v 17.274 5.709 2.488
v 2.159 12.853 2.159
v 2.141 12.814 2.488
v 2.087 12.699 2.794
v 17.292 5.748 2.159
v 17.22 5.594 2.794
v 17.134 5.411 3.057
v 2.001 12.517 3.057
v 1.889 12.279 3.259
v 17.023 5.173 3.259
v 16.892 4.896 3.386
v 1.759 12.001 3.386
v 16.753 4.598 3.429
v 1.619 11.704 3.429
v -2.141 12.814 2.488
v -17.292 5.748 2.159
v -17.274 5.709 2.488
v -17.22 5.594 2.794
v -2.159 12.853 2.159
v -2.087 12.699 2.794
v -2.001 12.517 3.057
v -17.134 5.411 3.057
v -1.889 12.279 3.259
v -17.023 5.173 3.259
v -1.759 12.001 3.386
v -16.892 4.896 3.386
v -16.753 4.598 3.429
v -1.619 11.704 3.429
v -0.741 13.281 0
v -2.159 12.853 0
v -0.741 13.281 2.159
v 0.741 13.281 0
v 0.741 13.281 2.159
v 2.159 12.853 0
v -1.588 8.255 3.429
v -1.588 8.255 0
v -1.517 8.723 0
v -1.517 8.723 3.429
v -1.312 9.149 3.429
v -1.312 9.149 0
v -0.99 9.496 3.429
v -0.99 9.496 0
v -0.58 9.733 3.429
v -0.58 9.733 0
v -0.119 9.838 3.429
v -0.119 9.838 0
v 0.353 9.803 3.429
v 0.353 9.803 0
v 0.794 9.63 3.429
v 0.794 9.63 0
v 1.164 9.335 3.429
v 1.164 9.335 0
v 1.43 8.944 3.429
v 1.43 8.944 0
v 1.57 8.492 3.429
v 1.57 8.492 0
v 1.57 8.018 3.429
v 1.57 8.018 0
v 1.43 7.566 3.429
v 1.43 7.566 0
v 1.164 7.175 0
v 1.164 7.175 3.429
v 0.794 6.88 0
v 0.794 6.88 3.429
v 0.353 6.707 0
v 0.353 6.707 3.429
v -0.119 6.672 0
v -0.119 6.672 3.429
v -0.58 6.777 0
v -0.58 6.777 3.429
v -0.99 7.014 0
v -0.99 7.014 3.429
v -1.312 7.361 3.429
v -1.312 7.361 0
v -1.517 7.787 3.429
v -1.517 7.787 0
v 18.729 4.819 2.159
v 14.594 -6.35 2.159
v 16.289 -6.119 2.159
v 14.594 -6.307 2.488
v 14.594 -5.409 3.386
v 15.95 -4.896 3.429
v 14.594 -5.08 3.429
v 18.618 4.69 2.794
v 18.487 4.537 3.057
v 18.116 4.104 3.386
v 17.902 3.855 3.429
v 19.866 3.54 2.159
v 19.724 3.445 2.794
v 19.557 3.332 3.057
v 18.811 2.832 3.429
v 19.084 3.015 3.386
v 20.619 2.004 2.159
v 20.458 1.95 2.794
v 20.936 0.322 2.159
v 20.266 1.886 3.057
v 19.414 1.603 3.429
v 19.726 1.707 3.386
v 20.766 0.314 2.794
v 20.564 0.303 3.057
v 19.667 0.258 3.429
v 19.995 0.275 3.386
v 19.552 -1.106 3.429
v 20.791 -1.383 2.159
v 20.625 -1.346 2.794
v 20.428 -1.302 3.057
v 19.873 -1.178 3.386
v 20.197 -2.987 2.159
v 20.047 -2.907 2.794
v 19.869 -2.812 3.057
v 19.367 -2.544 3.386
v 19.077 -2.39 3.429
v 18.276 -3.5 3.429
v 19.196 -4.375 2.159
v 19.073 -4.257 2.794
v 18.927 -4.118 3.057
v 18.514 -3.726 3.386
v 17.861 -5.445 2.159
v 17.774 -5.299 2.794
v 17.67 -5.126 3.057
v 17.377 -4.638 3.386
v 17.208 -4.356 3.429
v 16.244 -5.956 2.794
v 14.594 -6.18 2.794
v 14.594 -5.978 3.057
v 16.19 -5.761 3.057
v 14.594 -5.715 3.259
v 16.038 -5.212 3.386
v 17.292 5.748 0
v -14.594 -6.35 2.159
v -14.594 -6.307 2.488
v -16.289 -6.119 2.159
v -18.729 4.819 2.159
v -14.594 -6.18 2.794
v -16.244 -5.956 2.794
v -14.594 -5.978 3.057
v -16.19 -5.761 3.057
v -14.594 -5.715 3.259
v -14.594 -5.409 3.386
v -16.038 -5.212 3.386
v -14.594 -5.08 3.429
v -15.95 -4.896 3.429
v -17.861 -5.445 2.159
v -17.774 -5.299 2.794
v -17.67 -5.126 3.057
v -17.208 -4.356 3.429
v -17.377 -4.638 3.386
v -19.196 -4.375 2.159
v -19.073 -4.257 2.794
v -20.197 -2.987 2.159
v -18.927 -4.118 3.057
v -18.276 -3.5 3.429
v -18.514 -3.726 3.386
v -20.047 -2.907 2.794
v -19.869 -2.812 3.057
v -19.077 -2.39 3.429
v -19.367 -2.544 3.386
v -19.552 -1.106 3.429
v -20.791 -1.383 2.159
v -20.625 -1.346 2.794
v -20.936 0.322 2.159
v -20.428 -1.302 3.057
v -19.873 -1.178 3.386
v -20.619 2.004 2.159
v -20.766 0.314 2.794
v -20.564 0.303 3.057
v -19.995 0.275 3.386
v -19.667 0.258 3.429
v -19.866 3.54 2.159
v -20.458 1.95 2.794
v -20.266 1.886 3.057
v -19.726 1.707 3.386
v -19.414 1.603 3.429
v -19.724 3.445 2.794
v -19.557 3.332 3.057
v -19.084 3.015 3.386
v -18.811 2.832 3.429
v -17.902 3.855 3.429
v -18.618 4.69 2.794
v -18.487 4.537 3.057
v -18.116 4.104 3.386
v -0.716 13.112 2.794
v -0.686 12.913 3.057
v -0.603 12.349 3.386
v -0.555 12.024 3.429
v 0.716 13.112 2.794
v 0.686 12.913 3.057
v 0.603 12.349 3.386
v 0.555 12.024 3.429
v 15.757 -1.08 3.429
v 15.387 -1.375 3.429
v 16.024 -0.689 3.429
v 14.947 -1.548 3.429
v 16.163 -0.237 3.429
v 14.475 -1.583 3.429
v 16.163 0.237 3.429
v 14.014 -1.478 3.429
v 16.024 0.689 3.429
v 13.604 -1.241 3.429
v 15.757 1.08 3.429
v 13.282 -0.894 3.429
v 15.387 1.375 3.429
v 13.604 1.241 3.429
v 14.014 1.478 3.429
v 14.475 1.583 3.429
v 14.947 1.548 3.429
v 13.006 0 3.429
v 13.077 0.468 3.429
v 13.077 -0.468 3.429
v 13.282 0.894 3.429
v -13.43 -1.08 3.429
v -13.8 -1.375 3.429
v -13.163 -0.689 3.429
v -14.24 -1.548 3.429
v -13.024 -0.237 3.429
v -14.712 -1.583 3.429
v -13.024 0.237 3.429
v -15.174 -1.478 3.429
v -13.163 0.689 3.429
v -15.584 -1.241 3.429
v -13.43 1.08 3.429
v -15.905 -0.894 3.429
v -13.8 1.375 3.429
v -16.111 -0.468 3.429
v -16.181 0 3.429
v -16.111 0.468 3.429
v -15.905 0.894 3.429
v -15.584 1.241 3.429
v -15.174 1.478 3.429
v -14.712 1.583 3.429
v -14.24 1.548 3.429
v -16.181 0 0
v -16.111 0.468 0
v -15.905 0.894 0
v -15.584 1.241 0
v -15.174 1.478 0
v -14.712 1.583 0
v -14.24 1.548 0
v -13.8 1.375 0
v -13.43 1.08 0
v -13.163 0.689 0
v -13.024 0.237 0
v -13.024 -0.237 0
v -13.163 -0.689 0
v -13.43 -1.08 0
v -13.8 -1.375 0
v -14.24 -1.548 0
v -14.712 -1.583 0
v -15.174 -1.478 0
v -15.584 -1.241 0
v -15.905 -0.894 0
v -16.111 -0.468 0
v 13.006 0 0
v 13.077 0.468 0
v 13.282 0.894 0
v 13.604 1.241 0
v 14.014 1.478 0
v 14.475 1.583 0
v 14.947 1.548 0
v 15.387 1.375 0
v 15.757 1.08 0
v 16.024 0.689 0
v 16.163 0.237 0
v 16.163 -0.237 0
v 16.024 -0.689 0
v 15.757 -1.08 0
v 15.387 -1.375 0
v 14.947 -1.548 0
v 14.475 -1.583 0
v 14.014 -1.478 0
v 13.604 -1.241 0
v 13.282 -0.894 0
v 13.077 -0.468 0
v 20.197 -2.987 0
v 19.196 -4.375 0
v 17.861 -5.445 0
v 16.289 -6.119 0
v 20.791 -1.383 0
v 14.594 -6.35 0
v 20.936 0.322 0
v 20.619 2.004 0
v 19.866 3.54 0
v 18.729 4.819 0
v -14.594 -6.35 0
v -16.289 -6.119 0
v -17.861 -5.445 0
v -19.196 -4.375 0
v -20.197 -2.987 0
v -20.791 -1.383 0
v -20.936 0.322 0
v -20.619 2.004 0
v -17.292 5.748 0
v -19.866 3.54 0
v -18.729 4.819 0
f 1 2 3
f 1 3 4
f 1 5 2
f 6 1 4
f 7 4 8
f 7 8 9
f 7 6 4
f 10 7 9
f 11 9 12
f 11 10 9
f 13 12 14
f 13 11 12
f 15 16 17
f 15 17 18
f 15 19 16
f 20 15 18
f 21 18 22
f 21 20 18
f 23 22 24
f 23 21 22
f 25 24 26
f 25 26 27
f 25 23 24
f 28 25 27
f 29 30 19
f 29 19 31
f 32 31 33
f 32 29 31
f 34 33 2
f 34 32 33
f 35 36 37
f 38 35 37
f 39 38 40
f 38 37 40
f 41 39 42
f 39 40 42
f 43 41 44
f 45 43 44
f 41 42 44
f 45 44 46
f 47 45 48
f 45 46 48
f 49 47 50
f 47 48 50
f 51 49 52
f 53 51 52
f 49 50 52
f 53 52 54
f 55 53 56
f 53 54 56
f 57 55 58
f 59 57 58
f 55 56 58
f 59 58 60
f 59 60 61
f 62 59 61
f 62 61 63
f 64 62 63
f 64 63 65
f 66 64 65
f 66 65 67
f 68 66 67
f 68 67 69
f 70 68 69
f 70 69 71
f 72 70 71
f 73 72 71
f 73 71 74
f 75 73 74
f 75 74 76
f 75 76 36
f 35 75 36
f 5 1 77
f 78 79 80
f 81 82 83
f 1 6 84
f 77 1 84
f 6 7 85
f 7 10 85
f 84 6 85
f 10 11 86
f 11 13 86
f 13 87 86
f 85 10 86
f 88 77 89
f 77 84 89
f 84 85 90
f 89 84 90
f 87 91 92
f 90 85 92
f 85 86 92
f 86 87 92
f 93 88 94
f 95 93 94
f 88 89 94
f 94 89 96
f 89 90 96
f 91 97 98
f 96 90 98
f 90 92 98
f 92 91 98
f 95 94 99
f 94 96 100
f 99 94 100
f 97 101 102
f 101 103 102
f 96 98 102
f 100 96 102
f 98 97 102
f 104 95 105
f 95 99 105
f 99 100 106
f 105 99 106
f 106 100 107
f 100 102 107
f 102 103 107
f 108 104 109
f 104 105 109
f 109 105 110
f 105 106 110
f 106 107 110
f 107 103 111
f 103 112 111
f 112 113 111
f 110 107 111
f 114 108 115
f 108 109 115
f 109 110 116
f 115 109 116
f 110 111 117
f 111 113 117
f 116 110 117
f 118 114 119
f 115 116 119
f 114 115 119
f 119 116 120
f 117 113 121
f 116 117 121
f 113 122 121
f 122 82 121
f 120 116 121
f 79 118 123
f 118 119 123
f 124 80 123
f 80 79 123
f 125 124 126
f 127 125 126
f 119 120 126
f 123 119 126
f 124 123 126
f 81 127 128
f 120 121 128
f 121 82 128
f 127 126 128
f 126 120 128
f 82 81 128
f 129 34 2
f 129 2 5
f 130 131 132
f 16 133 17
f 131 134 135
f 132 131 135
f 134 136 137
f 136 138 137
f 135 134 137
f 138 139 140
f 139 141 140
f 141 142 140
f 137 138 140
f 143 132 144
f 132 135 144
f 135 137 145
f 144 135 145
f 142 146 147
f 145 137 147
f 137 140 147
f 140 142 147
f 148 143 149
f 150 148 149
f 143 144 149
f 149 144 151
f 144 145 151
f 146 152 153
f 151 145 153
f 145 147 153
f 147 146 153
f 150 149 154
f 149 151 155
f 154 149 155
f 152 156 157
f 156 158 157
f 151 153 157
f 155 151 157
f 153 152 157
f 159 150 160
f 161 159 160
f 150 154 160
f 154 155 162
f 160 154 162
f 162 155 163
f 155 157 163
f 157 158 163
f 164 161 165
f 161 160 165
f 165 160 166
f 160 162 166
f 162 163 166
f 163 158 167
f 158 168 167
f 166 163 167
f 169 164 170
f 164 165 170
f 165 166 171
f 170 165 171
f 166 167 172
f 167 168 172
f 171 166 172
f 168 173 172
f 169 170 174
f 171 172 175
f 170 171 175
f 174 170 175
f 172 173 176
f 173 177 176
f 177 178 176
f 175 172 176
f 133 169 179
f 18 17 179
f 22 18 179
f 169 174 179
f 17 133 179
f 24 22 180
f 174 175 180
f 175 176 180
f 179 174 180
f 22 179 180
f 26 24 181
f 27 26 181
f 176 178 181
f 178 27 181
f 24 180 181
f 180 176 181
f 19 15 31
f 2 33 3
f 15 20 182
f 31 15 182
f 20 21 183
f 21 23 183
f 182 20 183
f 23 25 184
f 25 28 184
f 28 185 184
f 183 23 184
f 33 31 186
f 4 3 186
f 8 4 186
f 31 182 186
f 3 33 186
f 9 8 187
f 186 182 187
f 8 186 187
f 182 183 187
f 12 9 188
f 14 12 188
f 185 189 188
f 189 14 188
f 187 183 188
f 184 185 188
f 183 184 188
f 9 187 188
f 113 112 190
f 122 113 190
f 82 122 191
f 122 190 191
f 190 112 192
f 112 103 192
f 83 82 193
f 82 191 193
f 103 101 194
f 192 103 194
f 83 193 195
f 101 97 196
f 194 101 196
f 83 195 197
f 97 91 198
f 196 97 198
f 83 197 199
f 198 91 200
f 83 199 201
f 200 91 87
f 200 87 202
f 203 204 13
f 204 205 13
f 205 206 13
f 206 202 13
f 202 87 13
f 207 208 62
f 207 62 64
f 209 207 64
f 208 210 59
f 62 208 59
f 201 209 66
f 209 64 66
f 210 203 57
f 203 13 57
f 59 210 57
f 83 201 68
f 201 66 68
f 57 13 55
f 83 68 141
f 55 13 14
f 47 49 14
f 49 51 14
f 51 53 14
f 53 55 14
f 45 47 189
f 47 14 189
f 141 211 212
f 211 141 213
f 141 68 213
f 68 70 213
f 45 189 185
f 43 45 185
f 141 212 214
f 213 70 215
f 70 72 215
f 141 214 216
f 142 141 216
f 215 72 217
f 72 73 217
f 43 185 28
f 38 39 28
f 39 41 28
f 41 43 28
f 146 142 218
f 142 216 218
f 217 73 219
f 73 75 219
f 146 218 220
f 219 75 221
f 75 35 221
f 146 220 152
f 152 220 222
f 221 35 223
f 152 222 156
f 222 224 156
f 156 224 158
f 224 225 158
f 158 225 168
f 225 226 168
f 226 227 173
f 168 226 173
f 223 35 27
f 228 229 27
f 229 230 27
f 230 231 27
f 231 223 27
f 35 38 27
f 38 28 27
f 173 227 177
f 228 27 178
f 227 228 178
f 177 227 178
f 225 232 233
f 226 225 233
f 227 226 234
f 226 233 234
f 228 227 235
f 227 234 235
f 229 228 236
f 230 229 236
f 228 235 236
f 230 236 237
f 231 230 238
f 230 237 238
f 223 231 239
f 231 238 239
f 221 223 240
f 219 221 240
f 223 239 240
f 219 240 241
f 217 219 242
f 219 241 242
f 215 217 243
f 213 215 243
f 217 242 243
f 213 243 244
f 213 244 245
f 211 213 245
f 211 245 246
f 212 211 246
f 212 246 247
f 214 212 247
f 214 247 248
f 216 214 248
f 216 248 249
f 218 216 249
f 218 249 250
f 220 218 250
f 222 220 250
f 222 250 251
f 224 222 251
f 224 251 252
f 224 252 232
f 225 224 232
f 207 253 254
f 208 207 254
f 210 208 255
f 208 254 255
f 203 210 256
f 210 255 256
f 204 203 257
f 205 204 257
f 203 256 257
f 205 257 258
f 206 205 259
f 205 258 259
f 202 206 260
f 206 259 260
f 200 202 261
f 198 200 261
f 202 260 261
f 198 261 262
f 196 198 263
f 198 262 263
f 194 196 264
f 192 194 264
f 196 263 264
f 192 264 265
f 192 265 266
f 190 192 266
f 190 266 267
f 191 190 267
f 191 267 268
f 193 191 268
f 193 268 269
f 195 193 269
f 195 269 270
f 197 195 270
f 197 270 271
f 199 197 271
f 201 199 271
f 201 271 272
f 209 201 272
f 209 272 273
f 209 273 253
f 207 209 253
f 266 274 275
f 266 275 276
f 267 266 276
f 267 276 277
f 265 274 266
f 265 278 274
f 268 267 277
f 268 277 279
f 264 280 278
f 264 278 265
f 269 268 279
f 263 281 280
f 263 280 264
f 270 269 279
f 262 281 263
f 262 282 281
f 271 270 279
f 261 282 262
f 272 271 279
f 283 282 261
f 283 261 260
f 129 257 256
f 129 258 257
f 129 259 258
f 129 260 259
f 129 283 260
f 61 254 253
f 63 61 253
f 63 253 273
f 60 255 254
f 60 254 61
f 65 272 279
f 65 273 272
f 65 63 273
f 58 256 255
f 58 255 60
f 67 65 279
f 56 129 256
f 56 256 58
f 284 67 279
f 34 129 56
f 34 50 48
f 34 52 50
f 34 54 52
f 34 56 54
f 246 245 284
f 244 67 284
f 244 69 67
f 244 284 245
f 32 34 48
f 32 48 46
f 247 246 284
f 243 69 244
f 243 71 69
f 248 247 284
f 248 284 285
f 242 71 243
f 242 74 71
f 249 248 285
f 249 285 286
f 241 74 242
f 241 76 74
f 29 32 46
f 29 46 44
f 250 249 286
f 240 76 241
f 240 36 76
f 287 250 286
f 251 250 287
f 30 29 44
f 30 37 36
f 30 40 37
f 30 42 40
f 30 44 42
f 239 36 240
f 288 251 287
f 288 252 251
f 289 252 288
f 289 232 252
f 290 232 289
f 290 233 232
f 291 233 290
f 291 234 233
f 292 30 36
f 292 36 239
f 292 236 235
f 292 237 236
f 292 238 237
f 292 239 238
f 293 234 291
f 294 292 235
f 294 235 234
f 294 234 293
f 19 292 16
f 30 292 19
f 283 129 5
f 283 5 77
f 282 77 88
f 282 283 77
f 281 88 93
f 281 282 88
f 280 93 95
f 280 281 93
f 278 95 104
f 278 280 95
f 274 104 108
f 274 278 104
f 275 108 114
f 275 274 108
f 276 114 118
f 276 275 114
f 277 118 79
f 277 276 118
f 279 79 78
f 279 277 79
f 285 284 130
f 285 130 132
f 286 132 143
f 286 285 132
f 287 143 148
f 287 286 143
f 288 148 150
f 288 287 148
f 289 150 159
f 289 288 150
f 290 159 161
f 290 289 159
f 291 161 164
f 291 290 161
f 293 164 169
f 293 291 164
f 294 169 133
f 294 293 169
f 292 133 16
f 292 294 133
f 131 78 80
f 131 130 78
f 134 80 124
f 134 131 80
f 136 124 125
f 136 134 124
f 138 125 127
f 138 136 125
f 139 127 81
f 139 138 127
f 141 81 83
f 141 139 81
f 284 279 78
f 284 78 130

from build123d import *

# Parameters (mm, degrees)
BOSS_EXTRUDE1_DEPTH        = 3.429
FILLET1_R                  = 1.27
F_1_8_0_1250_DOWEL_HOLE1_D = 3.175


with BuildPart() as part:
    # Sketch2 → Boss-Extrude1 (new body)
    with BuildSketch(Plane.XY):
        with BuildLine():
            Line((-17.292487403, 5.747971587), (-2.159010534, 12.853377269))
            ThreePointArc((-2.159010534, 12.853377269), (0, 13.335), (2.159010534, 12.853377269))
            Line((2.159010534, 12.853377269), (17.292487403, 5.747971587))
            ThreePointArc((17.292487403, 5.747971587), (20.791389907, -1.382548448), (14.593724234, -6.35))
            Line((14.593724234, -6.35), (-14.593724234, -6.35))
            ThreePointArc((-14.593724234, -6.35), (-20.791389907, -1.382548448), (-17.292487403, 5.747971587))
        make_face()
    extrude(amount=BOSS_EXTRUDE1_DEPTH)

    # Fillet1
    fillet1_edges = [part.edges().sort_by_distance(p)[0] for p in [
        (20.791389907, -1.382548448, 3.429),
        (9.725748968, 9.300674428, 3.429),
        (0, 13.335, 3.429),
        (-9.725748968, 9.300674428, 3.429),
        (-20.791389907, -1.382548448, 3.429),
        (0, -6.35, 3.429),
    ]]
    fillet(fillet1_edges, radius=FILLET1_R)

    # 1/8 (0.1250) Dowel Hole1 (through all)
    with Locations(Plane.XY.offset(3.429)):
        with Locations((0, 8.255), (-14.593724234, 0), (14.593724234, 0)):
            Hole(F_1_8_0_1250_DOWEL_HOLE1_D / 2)


solid = part.part
